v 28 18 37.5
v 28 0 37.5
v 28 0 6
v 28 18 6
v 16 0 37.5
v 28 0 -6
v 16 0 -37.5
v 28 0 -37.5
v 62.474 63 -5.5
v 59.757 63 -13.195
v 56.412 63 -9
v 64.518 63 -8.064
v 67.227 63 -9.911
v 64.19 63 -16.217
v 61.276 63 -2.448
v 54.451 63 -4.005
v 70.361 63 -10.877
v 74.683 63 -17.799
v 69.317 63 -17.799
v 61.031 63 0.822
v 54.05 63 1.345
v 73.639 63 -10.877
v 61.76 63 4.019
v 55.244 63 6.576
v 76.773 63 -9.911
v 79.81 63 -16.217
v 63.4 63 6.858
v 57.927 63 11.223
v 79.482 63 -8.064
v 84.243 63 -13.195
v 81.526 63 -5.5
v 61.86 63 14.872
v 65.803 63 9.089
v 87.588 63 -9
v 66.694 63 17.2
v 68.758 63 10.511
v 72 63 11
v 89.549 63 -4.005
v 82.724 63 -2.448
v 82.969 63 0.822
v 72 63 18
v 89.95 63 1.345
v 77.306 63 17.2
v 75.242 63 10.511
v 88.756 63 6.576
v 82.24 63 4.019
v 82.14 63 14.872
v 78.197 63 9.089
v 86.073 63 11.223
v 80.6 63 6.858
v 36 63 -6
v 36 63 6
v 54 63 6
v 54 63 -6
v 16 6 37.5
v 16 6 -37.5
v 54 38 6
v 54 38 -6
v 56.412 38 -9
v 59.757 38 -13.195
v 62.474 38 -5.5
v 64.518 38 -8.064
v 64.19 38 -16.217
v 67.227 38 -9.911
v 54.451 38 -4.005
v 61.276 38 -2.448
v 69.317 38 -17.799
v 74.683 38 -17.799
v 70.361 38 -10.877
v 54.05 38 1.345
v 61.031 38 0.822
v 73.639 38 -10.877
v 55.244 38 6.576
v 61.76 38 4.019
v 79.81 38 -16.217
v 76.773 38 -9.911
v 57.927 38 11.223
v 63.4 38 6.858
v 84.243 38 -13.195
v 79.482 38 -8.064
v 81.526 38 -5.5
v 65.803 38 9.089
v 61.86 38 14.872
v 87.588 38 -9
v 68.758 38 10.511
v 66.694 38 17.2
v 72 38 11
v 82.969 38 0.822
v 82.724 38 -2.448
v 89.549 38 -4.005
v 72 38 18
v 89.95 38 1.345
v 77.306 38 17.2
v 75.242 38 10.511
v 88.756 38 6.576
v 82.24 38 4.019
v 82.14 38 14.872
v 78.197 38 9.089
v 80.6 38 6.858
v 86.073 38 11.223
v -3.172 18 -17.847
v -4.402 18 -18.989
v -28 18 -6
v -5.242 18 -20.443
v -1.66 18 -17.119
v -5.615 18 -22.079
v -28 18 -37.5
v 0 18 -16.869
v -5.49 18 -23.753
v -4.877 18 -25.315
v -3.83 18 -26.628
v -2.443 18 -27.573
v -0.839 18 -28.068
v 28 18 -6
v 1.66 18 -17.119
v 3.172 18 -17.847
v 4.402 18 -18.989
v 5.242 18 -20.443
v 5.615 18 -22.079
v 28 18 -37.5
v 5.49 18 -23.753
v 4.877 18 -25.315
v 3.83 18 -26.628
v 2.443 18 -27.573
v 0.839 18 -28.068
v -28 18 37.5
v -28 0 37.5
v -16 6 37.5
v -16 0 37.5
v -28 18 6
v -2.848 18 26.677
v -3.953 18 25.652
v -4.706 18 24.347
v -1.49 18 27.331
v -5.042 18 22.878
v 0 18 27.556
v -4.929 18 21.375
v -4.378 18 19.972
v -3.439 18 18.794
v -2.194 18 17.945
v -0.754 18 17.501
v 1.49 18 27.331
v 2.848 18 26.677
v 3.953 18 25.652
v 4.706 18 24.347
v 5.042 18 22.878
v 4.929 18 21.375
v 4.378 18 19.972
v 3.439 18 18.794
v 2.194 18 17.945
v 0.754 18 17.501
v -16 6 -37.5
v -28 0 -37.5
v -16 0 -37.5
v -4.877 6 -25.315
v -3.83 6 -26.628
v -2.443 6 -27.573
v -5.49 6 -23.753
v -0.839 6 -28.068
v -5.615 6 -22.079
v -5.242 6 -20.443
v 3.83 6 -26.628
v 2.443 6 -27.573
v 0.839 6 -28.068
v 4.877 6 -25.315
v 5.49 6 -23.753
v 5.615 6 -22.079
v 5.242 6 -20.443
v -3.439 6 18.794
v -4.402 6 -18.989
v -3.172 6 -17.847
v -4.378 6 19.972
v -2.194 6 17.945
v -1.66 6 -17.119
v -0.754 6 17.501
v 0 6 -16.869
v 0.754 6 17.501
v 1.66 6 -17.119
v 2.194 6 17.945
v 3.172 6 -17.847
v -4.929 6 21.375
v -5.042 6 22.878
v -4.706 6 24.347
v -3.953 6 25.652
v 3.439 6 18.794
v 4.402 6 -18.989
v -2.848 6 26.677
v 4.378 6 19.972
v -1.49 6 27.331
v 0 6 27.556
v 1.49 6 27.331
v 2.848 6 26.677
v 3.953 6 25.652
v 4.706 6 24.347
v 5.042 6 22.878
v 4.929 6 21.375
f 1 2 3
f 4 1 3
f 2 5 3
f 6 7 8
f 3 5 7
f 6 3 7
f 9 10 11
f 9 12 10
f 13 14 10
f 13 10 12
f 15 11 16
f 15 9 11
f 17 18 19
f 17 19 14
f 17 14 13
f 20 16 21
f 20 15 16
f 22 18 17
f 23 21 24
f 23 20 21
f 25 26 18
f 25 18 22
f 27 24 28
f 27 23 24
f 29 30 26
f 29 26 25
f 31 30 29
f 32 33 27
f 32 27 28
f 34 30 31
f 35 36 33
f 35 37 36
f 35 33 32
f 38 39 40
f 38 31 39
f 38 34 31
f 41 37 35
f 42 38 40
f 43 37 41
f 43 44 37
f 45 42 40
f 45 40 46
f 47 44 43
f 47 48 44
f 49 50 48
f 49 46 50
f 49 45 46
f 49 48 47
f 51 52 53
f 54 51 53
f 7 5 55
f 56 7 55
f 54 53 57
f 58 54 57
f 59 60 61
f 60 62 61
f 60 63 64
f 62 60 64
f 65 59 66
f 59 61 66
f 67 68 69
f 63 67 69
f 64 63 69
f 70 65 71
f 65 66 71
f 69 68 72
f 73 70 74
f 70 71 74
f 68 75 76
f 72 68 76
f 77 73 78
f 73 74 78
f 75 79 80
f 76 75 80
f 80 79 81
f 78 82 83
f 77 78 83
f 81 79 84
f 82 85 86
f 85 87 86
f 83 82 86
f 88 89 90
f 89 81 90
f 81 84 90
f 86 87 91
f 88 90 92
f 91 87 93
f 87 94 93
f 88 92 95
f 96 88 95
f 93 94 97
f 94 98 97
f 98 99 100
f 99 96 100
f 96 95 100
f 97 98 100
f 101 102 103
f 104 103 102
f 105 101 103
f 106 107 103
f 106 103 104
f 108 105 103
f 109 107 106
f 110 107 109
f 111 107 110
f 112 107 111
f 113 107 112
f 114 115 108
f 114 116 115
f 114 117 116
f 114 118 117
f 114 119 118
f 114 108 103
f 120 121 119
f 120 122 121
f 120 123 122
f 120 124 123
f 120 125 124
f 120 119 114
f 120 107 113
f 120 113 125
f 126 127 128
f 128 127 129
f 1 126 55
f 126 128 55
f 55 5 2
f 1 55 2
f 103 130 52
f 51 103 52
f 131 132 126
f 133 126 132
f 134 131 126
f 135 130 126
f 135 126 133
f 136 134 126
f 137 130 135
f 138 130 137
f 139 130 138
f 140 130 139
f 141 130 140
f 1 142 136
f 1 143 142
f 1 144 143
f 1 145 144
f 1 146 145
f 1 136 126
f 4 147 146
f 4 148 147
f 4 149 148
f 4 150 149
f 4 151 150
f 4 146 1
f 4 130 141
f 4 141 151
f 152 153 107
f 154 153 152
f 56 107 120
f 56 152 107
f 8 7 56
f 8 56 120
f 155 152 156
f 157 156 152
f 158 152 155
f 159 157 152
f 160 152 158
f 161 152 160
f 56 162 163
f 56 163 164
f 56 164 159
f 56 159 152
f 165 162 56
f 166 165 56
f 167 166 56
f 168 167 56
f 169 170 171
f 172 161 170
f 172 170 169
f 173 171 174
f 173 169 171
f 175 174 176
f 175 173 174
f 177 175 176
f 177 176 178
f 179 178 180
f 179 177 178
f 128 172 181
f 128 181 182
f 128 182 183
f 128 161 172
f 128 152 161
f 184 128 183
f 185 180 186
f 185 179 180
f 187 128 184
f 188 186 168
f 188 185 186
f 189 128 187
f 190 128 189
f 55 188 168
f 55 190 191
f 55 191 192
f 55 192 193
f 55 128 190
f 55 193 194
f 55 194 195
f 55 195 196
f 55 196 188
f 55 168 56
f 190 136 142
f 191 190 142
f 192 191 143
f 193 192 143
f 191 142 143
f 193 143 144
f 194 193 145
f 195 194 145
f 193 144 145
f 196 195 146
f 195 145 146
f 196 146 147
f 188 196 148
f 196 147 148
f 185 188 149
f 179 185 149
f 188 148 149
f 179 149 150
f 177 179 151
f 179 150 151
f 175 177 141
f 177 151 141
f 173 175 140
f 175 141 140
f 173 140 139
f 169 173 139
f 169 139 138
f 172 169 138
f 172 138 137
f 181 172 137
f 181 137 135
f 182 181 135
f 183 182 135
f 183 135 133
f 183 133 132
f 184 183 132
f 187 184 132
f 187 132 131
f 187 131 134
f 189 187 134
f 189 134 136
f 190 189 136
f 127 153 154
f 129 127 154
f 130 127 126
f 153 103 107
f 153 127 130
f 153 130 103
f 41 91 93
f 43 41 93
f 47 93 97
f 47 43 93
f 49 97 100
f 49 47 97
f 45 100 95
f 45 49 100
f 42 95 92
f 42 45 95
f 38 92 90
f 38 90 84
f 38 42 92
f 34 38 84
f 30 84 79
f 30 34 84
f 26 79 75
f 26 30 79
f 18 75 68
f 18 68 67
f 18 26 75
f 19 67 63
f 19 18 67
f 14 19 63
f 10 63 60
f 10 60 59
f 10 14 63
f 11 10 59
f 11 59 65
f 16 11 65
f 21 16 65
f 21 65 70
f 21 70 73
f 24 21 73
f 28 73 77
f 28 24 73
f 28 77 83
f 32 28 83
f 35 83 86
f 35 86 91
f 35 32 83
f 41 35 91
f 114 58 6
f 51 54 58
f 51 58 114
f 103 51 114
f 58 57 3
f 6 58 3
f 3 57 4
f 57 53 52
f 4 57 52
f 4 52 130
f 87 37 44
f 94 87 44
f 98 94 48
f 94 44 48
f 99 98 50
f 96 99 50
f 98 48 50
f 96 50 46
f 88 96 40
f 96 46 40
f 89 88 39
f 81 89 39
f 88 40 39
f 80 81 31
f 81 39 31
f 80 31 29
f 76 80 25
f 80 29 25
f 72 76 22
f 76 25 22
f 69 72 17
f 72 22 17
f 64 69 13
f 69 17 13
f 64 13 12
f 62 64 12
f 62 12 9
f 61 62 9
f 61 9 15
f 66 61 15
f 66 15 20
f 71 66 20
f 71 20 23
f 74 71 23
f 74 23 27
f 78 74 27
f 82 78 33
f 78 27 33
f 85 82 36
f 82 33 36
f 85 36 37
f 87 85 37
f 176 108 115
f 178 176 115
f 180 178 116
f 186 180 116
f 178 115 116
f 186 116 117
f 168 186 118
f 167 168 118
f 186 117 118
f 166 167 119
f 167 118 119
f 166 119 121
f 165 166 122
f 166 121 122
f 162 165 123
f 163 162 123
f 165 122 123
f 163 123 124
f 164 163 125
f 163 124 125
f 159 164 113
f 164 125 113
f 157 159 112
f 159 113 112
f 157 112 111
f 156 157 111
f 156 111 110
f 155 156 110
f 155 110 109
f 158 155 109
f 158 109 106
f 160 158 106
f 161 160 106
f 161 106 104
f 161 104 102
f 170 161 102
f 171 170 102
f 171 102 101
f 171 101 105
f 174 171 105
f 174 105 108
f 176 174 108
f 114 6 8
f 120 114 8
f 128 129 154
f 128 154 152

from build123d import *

# Parameters (mm, degrees)
SKETCH1_W           = 56
SKETCH1_H           = 75
BOSS_EXTRUDE1_DEPTH = 18
SKETCH2_W           = 32
SKETCH2_H           = 6
CUT_EXTRUDE1_DEPTH  = 83.054859698
SKETCH3_R           = 5.055841373
SKETCH3_R_2         = 5.630971307
CUT_EXTRUDE2_DEPTH  = 51.142297514
BOSS_EXTRUDE2_DEPTH = 12
SKETCH8_R           = 18
SKETCH8_R_2         = 11
BOSS_EXTRUDE3_DEPTH = 25
BOSS_EXTRUDE4_DEPTH = 12


with BuildPart() as part:
    # Sketch1 → Boss-Extrude1 (new body)
    with BuildSketch(Plane(origin=(0, 0, 0), x_dir=(1, 0, 0), z_dir=(0, 1, 0))):
        Rectangle(SKETCH1_W, SKETCH1_H)
    extrude(amount=BOSS_EXTRUDE1_DEPTH)

    # Sketch2 → Cut-Extrude1 (cut, through all)
    with BuildSketch(Plane.XY.offset(37.5)):
        with Locations((0, 3)):
            Rectangle(SKETCH2_W, SKETCH2_H)
    extrude(amount=-CUT_EXTRUDE1_DEPTH, mode=Mode.SUBTRACT)

    # Sketch3 → Cut-Extrude2 (cut, through all)
    with BuildSketch(Plane(origin=(0, 18, 0), x_dir=(1, 0, 0), z_dir=(0, 1, 0))):
        with Locations(Location((0, -22.5, 0), (0, 0, 270))):
            Circle(SKETCH3_R)
        with Locations(Location((0, 22.5, 0), (0, 0, 270))):
            Circle(SKETCH3_R_2)
    extrude(amount=-CUT_EXTRUDE2_DEPTH, mode=Mode.SUBTRACT)

    # Sketch4 → Boss-Extrude2 (add)
    with BuildSketch(Plane.XY.offset(6)):
        Polygon((-28, 18), (36, 63), (36, 18), align=None)
    extrude(amount=-BOSS_EXTRUDE2_DEPTH)

    # Sketch9 → Boss-Extrude4 (add)
    with BuildSketch(Plane.XY.offset(6)):
        Polygon((36, 63), (54, 63), (54, 38), (28, 0), (28, 18), (36, 18), align=None)
    extrude(amount=-BOSS_EXTRUDE4_DEPTH)


with BuildPart() as body_2:
    # Sketch8 → Boss-Extrude3 (new body)
    with BuildSketch(Plane.ZX.offset(63)):
        with Locations((0, 72)):
            Circle(SKETCH8_R)
        with Locations((0, 72)):
            Circle(SKETCH8_R_2, mode=Mode.SUBTRACT)
    extrude(amount=-BOSS_EXTRUDE3_DEPTH)


solid = Compound([part.part, body_2.part])
